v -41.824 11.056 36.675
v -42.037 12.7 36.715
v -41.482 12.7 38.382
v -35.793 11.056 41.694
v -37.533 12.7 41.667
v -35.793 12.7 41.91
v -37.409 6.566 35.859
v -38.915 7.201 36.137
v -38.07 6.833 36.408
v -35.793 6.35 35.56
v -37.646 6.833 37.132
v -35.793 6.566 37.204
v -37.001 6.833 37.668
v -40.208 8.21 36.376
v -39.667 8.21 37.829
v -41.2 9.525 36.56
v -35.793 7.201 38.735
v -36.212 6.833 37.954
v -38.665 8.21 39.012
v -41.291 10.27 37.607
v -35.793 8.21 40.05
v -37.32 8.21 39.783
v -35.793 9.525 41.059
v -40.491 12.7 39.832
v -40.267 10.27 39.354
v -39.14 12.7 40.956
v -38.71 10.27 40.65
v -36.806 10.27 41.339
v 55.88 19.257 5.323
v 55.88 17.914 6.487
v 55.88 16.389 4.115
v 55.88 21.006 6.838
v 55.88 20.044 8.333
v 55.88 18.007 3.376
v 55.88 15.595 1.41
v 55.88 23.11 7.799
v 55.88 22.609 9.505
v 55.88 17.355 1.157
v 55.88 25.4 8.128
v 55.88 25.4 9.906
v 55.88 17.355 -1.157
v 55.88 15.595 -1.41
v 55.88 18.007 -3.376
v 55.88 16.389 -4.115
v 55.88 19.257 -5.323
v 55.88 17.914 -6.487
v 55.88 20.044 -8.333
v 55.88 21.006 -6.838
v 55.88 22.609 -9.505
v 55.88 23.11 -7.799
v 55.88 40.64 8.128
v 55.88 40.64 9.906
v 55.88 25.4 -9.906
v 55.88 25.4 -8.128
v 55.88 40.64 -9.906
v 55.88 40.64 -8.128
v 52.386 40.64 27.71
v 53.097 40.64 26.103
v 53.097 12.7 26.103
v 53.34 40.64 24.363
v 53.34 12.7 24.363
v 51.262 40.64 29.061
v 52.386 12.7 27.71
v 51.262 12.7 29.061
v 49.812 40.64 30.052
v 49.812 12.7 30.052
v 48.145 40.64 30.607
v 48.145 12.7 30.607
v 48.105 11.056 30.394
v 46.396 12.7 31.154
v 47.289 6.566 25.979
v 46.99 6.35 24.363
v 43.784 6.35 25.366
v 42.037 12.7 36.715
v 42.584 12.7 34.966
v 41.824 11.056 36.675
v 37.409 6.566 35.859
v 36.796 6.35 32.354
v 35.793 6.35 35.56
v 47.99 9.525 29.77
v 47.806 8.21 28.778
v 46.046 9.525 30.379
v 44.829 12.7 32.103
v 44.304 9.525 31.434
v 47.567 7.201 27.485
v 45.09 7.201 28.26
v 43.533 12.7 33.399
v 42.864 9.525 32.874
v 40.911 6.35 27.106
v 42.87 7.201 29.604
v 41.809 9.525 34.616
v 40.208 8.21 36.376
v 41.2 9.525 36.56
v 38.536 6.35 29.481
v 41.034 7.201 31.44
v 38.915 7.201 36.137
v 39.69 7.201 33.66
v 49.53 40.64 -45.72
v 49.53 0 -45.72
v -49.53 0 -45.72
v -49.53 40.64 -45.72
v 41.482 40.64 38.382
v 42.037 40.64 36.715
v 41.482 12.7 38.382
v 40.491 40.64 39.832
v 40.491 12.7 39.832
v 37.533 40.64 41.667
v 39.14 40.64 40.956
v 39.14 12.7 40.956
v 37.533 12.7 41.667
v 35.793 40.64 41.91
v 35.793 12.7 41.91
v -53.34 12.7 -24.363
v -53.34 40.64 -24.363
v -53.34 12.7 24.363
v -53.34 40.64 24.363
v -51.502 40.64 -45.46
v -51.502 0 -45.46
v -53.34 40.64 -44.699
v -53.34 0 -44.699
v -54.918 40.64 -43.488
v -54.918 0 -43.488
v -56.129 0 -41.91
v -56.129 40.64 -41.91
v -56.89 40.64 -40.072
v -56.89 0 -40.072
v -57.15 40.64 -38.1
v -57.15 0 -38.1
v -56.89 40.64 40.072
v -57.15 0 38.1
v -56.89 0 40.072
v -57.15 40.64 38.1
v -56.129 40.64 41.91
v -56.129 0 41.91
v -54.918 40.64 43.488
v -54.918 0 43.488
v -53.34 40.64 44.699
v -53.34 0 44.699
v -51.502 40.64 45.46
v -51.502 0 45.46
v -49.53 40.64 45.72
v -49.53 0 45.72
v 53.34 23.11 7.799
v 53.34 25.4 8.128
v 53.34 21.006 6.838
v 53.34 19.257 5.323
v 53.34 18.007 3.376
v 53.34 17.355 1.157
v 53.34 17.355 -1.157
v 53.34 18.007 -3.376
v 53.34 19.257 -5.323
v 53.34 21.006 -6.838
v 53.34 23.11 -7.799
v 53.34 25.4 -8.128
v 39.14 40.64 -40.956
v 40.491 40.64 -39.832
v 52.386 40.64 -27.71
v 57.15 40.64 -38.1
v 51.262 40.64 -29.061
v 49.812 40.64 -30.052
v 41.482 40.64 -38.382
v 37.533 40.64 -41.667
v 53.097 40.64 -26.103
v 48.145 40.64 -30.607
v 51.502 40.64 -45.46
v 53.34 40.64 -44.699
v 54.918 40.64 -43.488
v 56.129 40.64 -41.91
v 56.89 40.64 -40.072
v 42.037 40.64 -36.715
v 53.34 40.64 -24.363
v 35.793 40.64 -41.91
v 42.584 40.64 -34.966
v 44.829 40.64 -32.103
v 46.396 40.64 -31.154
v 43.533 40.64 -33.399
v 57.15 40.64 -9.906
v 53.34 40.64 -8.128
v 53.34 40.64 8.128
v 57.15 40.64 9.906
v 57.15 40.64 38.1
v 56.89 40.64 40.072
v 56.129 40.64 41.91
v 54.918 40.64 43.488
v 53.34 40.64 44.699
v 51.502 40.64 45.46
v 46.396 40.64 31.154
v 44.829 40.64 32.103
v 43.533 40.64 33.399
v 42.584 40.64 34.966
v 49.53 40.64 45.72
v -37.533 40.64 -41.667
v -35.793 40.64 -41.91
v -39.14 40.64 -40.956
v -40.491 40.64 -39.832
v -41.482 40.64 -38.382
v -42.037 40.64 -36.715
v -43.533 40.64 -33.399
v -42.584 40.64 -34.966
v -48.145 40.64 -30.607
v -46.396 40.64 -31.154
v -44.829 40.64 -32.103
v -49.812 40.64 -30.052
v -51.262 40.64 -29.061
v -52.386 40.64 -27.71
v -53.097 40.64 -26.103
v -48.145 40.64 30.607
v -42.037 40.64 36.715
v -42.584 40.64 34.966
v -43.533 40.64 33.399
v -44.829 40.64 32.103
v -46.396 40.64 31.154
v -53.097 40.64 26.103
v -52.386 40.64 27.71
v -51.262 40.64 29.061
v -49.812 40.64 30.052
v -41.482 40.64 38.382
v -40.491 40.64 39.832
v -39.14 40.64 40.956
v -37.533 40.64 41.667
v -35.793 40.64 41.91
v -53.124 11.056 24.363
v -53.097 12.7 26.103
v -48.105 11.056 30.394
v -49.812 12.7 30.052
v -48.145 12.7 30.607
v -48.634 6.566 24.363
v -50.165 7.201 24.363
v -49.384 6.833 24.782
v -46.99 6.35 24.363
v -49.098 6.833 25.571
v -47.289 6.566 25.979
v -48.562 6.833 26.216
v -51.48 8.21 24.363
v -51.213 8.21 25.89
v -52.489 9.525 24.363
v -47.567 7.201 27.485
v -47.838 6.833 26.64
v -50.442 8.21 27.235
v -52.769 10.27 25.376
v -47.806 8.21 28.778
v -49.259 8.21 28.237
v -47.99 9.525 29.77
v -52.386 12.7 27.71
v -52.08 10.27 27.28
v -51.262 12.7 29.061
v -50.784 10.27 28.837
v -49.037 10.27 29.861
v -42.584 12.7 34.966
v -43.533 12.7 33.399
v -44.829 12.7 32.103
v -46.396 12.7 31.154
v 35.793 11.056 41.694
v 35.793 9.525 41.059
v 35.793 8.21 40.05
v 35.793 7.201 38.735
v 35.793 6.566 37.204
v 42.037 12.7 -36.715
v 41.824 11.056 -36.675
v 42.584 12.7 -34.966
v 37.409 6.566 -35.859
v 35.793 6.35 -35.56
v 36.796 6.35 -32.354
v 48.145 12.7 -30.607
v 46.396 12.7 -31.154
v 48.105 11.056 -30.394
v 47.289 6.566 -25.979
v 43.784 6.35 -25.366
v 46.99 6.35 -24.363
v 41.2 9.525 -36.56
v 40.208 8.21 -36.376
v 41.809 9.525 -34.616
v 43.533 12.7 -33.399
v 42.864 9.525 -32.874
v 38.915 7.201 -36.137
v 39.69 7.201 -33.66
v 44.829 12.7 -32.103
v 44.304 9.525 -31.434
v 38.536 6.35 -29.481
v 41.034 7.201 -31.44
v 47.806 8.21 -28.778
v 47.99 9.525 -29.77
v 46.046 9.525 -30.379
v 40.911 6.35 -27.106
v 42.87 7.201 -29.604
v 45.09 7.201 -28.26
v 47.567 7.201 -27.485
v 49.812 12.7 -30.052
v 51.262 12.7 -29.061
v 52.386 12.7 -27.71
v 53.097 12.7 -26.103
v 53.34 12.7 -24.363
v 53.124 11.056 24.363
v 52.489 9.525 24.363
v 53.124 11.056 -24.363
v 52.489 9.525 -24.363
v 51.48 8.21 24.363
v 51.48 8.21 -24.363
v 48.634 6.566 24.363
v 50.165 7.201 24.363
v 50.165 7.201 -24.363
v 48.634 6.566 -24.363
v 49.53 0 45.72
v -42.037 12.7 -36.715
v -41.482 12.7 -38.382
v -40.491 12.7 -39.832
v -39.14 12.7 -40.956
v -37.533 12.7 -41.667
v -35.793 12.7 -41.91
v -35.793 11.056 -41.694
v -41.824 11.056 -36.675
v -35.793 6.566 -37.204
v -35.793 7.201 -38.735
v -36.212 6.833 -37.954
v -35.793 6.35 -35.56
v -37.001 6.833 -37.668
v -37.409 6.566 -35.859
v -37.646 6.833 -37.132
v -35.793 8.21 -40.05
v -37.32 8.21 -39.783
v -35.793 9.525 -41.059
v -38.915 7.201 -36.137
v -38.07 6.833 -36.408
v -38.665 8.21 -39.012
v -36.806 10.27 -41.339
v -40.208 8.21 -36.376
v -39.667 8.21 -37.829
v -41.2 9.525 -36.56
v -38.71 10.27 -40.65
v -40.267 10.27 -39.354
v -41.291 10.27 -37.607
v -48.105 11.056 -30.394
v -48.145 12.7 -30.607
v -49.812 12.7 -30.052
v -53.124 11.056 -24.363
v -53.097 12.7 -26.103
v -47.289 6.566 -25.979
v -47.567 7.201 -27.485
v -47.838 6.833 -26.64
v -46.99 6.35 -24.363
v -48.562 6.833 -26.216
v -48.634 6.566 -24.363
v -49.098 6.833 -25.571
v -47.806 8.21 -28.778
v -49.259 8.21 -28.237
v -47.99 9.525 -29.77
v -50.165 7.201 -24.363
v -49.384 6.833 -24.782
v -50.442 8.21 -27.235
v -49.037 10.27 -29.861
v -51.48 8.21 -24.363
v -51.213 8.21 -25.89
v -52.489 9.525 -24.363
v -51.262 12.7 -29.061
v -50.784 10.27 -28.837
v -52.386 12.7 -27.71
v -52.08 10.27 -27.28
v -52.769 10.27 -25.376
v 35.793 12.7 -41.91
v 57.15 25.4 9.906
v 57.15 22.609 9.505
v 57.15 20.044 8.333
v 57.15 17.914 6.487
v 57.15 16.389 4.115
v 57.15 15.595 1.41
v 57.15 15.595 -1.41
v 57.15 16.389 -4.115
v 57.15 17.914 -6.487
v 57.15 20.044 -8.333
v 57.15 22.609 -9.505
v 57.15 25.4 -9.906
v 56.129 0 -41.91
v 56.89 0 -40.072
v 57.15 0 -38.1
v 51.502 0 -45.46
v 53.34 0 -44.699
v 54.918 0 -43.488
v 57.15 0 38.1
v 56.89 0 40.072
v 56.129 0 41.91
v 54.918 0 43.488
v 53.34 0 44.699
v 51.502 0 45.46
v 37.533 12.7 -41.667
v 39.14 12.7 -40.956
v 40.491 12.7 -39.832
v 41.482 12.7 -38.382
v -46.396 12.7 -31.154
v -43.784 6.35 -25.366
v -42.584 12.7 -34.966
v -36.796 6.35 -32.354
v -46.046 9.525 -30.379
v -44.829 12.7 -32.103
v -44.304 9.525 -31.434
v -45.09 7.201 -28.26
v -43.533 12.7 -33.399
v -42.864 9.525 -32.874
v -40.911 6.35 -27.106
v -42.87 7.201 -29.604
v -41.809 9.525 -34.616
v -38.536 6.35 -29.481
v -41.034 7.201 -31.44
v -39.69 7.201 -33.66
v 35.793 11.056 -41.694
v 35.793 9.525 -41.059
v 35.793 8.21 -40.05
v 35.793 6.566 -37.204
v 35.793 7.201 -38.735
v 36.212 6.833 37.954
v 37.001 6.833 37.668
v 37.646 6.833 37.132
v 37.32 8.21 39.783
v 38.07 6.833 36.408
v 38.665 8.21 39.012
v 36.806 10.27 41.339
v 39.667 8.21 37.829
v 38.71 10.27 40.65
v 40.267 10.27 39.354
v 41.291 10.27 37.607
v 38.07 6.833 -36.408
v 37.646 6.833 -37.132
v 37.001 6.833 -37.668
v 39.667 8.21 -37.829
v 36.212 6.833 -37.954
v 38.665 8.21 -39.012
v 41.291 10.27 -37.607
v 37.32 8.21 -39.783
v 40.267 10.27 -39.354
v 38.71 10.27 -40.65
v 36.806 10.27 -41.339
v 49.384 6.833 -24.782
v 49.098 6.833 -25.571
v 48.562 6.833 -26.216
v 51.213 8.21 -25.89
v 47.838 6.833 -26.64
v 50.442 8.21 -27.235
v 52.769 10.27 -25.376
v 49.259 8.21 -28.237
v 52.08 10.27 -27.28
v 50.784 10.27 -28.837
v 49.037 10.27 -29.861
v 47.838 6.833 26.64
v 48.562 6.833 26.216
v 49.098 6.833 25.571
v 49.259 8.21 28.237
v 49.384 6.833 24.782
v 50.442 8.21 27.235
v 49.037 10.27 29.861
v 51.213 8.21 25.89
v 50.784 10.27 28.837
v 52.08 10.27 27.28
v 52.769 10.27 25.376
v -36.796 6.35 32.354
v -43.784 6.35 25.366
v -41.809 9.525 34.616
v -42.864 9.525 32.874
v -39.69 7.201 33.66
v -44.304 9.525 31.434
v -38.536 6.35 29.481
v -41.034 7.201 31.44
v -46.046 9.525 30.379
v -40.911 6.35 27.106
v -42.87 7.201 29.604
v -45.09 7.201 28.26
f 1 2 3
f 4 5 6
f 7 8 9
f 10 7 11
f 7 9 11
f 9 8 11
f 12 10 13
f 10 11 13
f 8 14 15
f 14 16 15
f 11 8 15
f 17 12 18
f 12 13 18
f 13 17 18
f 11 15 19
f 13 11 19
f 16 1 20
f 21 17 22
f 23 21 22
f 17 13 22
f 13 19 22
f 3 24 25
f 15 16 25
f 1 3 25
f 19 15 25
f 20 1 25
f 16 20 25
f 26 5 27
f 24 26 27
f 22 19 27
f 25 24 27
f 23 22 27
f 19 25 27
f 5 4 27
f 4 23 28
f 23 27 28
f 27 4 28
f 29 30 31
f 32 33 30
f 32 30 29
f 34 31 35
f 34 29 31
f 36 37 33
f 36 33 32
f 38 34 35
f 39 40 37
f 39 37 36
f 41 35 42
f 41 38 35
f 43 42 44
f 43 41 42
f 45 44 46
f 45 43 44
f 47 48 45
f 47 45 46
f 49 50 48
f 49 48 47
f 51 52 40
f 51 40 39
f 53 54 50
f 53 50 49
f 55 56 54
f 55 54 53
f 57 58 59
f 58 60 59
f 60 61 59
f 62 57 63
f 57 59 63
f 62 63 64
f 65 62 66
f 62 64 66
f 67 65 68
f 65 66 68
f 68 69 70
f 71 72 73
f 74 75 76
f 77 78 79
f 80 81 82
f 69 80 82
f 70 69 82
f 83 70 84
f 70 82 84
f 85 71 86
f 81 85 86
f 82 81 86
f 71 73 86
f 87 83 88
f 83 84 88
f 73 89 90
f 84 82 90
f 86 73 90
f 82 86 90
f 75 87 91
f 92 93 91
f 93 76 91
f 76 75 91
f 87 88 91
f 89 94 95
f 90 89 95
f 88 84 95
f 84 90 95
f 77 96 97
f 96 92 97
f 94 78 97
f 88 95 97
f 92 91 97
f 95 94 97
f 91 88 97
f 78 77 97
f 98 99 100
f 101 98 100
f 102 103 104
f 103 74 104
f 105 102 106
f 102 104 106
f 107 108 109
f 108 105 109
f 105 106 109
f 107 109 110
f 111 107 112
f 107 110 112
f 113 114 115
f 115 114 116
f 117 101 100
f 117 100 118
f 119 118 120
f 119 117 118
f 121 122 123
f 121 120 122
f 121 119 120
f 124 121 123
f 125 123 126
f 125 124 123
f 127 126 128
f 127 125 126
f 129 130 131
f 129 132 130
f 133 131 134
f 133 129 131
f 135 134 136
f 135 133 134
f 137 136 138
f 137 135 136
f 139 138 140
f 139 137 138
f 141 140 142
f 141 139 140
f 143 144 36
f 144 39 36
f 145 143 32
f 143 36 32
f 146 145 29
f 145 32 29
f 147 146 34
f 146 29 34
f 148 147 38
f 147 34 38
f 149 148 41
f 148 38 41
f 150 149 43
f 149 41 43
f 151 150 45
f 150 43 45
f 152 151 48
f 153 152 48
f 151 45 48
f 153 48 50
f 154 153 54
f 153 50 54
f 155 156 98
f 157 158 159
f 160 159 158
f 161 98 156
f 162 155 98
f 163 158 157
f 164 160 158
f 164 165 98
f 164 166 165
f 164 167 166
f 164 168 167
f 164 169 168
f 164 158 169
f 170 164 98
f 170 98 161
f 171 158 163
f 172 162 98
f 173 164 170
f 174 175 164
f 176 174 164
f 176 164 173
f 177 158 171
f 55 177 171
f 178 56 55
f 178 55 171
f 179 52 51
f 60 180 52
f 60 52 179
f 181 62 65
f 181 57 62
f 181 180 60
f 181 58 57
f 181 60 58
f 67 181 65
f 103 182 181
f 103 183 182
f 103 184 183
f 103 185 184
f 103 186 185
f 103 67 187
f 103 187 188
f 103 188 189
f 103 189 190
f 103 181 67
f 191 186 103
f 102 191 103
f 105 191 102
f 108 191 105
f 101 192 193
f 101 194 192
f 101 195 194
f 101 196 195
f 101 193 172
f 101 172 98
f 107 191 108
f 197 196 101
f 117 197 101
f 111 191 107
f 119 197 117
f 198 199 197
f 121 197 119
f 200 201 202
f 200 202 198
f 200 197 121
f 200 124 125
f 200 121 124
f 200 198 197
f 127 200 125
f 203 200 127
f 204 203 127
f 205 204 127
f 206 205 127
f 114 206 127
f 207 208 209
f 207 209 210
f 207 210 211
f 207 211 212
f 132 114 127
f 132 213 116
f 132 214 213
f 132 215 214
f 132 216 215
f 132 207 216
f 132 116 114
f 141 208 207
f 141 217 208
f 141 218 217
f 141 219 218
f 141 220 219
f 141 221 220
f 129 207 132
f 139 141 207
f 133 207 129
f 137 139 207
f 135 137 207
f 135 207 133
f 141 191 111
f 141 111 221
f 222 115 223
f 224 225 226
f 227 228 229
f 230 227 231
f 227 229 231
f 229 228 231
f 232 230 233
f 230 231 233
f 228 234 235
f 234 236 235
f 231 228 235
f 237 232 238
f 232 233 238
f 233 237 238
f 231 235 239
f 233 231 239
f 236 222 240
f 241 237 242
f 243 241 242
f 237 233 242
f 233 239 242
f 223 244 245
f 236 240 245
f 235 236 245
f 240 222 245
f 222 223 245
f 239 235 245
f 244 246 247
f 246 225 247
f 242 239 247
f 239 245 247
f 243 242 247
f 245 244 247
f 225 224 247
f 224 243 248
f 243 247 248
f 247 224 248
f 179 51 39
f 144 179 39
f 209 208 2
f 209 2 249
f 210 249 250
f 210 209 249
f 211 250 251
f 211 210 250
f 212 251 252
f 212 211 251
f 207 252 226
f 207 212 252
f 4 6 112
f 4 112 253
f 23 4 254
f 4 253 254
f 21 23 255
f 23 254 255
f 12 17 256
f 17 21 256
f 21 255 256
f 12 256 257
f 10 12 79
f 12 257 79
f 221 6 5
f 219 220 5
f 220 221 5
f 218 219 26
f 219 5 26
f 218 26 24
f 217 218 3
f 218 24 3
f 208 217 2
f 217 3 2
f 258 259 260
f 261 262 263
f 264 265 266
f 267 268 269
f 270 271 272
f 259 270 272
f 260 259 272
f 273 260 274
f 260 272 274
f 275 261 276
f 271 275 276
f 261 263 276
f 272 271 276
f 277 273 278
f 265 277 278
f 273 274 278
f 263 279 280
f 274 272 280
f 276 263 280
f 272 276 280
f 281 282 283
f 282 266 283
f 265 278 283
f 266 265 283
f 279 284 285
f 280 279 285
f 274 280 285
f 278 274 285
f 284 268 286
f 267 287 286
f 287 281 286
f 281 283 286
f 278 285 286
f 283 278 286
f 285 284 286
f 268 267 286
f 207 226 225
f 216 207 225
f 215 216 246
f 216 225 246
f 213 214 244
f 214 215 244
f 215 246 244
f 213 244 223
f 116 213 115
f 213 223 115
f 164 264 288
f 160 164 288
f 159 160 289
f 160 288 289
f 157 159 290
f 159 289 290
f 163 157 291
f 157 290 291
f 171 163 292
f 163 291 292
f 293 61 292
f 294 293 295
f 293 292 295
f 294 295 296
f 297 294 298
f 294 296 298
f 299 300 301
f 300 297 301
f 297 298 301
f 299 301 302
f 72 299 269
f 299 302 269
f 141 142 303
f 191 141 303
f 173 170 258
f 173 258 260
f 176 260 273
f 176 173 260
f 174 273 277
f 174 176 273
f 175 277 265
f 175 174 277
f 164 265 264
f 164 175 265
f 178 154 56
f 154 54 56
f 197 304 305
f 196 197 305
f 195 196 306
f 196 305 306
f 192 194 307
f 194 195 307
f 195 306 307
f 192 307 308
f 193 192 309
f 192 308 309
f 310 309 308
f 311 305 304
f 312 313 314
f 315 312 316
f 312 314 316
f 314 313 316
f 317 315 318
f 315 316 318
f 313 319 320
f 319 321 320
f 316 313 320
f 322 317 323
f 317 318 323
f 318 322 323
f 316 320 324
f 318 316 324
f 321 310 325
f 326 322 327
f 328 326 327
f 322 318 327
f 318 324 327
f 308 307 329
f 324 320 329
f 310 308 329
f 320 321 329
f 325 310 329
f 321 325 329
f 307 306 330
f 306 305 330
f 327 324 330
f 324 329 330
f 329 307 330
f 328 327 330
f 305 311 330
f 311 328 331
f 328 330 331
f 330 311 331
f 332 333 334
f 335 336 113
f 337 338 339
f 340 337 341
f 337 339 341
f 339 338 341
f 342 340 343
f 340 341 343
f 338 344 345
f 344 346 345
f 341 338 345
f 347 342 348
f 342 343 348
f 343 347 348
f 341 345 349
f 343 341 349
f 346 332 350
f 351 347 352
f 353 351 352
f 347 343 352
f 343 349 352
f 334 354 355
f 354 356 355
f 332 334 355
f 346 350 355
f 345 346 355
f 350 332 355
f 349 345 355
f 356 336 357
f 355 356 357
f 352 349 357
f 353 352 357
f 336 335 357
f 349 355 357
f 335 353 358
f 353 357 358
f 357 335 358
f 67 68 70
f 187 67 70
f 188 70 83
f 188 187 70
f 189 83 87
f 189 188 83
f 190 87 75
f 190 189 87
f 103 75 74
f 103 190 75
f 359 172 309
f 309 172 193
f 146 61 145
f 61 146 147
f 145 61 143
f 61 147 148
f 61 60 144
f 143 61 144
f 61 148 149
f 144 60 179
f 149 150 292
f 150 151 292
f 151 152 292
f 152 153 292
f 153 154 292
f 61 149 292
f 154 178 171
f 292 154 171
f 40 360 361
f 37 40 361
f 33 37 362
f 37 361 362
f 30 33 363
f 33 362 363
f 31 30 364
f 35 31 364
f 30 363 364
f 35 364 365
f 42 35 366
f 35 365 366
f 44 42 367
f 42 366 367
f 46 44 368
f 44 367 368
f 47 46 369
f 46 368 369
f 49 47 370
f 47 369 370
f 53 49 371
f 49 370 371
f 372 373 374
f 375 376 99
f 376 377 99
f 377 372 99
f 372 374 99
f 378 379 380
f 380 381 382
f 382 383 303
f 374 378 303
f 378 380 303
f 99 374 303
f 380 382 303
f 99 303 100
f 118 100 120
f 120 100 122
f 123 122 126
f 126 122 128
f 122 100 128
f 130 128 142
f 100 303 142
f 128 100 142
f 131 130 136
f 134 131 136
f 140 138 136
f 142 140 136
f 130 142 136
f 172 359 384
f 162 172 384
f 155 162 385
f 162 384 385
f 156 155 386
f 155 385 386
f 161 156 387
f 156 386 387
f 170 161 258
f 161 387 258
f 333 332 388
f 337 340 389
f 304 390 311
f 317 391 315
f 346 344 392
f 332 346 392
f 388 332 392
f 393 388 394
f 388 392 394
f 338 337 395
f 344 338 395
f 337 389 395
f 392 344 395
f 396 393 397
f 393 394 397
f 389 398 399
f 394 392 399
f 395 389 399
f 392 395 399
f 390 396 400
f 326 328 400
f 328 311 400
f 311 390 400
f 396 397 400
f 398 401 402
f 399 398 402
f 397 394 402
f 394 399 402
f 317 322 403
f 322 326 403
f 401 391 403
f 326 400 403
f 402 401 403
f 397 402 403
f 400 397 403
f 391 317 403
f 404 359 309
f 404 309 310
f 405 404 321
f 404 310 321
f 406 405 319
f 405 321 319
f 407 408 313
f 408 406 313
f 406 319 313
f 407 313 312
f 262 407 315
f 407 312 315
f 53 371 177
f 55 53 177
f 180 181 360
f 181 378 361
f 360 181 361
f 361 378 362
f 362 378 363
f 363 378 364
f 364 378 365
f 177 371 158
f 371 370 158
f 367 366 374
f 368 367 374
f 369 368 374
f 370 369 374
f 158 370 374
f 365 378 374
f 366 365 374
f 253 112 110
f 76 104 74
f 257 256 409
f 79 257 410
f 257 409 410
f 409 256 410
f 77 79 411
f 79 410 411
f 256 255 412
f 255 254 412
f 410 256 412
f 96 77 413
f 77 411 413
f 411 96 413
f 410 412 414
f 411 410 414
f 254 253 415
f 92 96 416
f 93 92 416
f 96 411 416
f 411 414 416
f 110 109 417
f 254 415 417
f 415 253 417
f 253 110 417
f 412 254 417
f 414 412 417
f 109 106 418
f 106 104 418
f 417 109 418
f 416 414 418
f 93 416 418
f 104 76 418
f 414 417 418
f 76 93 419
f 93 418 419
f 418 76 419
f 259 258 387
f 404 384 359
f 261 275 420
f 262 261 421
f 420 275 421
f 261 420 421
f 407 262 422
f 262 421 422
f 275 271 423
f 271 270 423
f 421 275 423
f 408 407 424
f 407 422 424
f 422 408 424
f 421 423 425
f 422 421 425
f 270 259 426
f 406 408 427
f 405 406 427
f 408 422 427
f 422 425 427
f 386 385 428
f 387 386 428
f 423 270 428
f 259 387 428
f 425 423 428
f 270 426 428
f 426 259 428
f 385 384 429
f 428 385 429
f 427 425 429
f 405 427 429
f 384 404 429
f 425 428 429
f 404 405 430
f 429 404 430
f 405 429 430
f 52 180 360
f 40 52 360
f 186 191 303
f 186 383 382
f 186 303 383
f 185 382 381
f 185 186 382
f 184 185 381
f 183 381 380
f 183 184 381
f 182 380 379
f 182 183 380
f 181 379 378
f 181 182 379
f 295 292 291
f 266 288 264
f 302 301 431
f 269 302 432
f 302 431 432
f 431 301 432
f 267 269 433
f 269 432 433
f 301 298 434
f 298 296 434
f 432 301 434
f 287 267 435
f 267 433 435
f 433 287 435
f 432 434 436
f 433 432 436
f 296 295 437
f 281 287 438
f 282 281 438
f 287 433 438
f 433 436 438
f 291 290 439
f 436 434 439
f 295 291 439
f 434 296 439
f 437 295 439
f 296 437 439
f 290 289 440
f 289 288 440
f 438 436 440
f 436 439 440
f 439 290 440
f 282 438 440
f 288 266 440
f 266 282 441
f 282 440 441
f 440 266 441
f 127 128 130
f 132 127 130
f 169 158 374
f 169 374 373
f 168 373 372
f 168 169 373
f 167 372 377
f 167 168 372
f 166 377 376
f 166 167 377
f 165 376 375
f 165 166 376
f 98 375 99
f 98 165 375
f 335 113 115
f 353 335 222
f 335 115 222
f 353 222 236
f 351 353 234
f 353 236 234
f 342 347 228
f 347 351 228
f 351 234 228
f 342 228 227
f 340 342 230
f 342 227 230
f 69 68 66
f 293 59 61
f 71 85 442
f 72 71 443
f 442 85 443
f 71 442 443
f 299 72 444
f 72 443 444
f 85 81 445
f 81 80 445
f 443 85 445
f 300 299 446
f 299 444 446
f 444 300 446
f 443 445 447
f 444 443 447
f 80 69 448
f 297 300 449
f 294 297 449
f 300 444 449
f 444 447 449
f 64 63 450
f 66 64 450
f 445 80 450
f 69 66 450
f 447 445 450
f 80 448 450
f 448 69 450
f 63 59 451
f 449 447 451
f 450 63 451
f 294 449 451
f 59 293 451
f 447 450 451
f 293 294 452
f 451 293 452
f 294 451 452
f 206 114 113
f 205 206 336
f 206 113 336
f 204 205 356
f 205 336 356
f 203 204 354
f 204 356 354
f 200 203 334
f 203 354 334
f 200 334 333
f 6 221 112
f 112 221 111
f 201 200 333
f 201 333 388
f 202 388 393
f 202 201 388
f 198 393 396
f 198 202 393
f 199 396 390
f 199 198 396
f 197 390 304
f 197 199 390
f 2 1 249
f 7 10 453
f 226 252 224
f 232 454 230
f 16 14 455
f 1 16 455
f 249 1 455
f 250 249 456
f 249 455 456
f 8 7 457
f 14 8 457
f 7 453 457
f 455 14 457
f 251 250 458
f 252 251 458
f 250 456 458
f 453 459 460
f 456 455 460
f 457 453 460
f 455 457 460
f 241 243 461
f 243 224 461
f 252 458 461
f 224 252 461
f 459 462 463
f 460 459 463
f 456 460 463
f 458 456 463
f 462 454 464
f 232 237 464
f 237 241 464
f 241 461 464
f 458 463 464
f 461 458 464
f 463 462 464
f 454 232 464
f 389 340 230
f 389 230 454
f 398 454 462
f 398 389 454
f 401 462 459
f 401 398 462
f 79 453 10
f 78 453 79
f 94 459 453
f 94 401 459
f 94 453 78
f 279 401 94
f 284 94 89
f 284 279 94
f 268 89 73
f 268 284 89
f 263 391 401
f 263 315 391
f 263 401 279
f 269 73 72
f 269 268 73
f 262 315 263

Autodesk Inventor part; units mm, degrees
ref_plane "YZ Plane" through (0, 0, 0) normal (1, 0, 0) x (0, 1, 0)
ref_plane "XZ Plane" through (0, 0, 0) normal (0, 1, 0) x (-1, 0, 0)
ref_plane "XY Plane" through (0, 0, 0) normal (0, 0, 1) x (1, 0, 0)
sketch "Sketch1" plane through (0, 0, 0) normal (0, 1, 0) x (-1, 0, 0)
  line L0 (57.15, 45.72) -> (-57.15, 45.72)
  line L1 (-57.15, 45.72) -> (-57.15, -45.72)
  line L2 (-57.15, -45.72) -> (57.15, -45.72)
  line L3 (57.15, -45.72) -> (57.15, 45.72)
  point P0 (0, 0)
  point P1 (-57.15, 0)
  point P2 (0, -45.72)
  dimension "d0" = 114.3
  dimension "d1" = 91.44
extrude "Extrusion1" add sketch "Sketch1" along normal blind 40.64
fillet "Fillet1" radius 7.62 4 edges at (-57.15, 20.32, 45.72) (57.15, 20.32, 45.72) (-57.15, 20.32, -45.72) (57.15, 20.32, -45.72)
sketch "Sketch2" plane through (0, 40.64, 0) normal (0, 1, 0) x (1, 0, 0)
  arc A0 (-57.15, -38.1) -> (-49.53, -45.72) centre (-49.53, -38.1) ccw projected
  line L0 (-57.15, 38.1) -> (-57.15, -38.1) projected
  circle A1 centre (-49.53, -38.1) radius 7.62
  arc A2 (-49.53, 45.72) -> (-57.15, 38.1) centre (-49.53, 38.1) ccw projected
  circle A3 centre (-49.53, 38.1) radius 7.62
  arc A4 (57.15, 38.1) -> (49.53, 45.72) centre (49.53, 38.1) ccw projected
  line L1 (49.53, 45.72) -> (-49.53, 45.72) projected
  circle A5 centre (49.53, 38.1) radius 7.62
  arc A6 (49.53, -45.72) -> (57.15, -38.1) centre (49.53, -38.1) ccw projected
  circle A7 centre (49.53, -38.1) radius 7.62
  line L2 (-53.34, -41.91) -> (53.34, -41.91)
  line L3 (53.34, -41.91) -> (53.34, 41.91)
  line L4 (53.34, 41.91) -> (-53.34, 41.91)
  line L5 (-53.34, 41.91) -> (-53.34, -41.91)
  point P0 (0, 0)
  point P1 (-53.34, 0)
  point P2 (0, 41.91)
  point P3 (-53.34, 31.5009)
  point P4 (-53.34, -31.5009)
  point P5 (-42.9309, -41.91)
  point P6 (42.9309, -41.91)
  point P7 (53.34, -31.5009)
  point P8 (53.34, 31.5009)
  point P9 (42.9309, 41.91)
  point P10 (-42.9309, 41.91)
  dimension "d5" = 3.81
  dimension "d6" = 3.81
extrude "Extrusion2" cut sketch "Sketch2" against normal blind 34.29 contours L5 A3 L4 A5 L3 A7 L2 A1
fillet "Fillet2" radius 6.35 16 edges at (-42.9309, 23.495, 41.91) (-53.34, 23.495, 31.5009) (0, 6.35, 41.91) (-53.34, 6.35, 0) (-53.34, 23.495, -31.5009) (-44.1418, 6.35, -32.7118) (-42.9309, 23.495, -41.91) (-44.1418, 6.35, 32.7118) (44.1418, 6.35, 32.7118) (42.9309, 23.495, 41.91) (53.34, 23.495, 31.5009) (53.34, 6.35, 0) (44.1418, 6.35, -32.7118) (53.34, 23.495, -31.5009) (42.9309, 23.495, -41.91) (0, 6.35, -41.91)
sketch "Sketch3" plane through (57.15, 0, 38.1) normal (1, 0, 0) x (0, 0, -1)
  line L0 (13.7372, 40.64) -> (62.4628, 40.64) projected
  line L1 (29.972, 40.64) -> (29.972, 25.4)
  arc A0 (29.972, 25.4) -> (46.228, 25.4) centre (38.1, 25.4) ccw
  line L2 (46.228, 25.4) -> (46.228, 40.64)
  line L3 (28.194, 40.64) -> (28.194, 25.4)
  arc A1 (28.194, 25.4) -> (48.006, 25.4) centre (38.1, 25.4) ccw
  line L4 (48.006, 25.4) -> (48.006, 40.64)
  point P0 (38.1, 0)
  point P1 (38.1, 40.64)
  point P2 (28.194, 40.64)
  dimension "d10" = 15.24
  dimension "d11" = 8.128
  dimension "d12" = 1.778
extrude "Extrusion3" cut sketch "Sketch3" against normal up to surface (3.81 mm away) contours L0 L2 A0 L1
extrude "Extrusion4" cut sketch "Sketch3" against normal blind 1.27 contours L0 L1 A0 L2 L4 A1 L3
equation "\"d6\" = d5"
properties part number "Machined Base" material "Steel, Mild"
